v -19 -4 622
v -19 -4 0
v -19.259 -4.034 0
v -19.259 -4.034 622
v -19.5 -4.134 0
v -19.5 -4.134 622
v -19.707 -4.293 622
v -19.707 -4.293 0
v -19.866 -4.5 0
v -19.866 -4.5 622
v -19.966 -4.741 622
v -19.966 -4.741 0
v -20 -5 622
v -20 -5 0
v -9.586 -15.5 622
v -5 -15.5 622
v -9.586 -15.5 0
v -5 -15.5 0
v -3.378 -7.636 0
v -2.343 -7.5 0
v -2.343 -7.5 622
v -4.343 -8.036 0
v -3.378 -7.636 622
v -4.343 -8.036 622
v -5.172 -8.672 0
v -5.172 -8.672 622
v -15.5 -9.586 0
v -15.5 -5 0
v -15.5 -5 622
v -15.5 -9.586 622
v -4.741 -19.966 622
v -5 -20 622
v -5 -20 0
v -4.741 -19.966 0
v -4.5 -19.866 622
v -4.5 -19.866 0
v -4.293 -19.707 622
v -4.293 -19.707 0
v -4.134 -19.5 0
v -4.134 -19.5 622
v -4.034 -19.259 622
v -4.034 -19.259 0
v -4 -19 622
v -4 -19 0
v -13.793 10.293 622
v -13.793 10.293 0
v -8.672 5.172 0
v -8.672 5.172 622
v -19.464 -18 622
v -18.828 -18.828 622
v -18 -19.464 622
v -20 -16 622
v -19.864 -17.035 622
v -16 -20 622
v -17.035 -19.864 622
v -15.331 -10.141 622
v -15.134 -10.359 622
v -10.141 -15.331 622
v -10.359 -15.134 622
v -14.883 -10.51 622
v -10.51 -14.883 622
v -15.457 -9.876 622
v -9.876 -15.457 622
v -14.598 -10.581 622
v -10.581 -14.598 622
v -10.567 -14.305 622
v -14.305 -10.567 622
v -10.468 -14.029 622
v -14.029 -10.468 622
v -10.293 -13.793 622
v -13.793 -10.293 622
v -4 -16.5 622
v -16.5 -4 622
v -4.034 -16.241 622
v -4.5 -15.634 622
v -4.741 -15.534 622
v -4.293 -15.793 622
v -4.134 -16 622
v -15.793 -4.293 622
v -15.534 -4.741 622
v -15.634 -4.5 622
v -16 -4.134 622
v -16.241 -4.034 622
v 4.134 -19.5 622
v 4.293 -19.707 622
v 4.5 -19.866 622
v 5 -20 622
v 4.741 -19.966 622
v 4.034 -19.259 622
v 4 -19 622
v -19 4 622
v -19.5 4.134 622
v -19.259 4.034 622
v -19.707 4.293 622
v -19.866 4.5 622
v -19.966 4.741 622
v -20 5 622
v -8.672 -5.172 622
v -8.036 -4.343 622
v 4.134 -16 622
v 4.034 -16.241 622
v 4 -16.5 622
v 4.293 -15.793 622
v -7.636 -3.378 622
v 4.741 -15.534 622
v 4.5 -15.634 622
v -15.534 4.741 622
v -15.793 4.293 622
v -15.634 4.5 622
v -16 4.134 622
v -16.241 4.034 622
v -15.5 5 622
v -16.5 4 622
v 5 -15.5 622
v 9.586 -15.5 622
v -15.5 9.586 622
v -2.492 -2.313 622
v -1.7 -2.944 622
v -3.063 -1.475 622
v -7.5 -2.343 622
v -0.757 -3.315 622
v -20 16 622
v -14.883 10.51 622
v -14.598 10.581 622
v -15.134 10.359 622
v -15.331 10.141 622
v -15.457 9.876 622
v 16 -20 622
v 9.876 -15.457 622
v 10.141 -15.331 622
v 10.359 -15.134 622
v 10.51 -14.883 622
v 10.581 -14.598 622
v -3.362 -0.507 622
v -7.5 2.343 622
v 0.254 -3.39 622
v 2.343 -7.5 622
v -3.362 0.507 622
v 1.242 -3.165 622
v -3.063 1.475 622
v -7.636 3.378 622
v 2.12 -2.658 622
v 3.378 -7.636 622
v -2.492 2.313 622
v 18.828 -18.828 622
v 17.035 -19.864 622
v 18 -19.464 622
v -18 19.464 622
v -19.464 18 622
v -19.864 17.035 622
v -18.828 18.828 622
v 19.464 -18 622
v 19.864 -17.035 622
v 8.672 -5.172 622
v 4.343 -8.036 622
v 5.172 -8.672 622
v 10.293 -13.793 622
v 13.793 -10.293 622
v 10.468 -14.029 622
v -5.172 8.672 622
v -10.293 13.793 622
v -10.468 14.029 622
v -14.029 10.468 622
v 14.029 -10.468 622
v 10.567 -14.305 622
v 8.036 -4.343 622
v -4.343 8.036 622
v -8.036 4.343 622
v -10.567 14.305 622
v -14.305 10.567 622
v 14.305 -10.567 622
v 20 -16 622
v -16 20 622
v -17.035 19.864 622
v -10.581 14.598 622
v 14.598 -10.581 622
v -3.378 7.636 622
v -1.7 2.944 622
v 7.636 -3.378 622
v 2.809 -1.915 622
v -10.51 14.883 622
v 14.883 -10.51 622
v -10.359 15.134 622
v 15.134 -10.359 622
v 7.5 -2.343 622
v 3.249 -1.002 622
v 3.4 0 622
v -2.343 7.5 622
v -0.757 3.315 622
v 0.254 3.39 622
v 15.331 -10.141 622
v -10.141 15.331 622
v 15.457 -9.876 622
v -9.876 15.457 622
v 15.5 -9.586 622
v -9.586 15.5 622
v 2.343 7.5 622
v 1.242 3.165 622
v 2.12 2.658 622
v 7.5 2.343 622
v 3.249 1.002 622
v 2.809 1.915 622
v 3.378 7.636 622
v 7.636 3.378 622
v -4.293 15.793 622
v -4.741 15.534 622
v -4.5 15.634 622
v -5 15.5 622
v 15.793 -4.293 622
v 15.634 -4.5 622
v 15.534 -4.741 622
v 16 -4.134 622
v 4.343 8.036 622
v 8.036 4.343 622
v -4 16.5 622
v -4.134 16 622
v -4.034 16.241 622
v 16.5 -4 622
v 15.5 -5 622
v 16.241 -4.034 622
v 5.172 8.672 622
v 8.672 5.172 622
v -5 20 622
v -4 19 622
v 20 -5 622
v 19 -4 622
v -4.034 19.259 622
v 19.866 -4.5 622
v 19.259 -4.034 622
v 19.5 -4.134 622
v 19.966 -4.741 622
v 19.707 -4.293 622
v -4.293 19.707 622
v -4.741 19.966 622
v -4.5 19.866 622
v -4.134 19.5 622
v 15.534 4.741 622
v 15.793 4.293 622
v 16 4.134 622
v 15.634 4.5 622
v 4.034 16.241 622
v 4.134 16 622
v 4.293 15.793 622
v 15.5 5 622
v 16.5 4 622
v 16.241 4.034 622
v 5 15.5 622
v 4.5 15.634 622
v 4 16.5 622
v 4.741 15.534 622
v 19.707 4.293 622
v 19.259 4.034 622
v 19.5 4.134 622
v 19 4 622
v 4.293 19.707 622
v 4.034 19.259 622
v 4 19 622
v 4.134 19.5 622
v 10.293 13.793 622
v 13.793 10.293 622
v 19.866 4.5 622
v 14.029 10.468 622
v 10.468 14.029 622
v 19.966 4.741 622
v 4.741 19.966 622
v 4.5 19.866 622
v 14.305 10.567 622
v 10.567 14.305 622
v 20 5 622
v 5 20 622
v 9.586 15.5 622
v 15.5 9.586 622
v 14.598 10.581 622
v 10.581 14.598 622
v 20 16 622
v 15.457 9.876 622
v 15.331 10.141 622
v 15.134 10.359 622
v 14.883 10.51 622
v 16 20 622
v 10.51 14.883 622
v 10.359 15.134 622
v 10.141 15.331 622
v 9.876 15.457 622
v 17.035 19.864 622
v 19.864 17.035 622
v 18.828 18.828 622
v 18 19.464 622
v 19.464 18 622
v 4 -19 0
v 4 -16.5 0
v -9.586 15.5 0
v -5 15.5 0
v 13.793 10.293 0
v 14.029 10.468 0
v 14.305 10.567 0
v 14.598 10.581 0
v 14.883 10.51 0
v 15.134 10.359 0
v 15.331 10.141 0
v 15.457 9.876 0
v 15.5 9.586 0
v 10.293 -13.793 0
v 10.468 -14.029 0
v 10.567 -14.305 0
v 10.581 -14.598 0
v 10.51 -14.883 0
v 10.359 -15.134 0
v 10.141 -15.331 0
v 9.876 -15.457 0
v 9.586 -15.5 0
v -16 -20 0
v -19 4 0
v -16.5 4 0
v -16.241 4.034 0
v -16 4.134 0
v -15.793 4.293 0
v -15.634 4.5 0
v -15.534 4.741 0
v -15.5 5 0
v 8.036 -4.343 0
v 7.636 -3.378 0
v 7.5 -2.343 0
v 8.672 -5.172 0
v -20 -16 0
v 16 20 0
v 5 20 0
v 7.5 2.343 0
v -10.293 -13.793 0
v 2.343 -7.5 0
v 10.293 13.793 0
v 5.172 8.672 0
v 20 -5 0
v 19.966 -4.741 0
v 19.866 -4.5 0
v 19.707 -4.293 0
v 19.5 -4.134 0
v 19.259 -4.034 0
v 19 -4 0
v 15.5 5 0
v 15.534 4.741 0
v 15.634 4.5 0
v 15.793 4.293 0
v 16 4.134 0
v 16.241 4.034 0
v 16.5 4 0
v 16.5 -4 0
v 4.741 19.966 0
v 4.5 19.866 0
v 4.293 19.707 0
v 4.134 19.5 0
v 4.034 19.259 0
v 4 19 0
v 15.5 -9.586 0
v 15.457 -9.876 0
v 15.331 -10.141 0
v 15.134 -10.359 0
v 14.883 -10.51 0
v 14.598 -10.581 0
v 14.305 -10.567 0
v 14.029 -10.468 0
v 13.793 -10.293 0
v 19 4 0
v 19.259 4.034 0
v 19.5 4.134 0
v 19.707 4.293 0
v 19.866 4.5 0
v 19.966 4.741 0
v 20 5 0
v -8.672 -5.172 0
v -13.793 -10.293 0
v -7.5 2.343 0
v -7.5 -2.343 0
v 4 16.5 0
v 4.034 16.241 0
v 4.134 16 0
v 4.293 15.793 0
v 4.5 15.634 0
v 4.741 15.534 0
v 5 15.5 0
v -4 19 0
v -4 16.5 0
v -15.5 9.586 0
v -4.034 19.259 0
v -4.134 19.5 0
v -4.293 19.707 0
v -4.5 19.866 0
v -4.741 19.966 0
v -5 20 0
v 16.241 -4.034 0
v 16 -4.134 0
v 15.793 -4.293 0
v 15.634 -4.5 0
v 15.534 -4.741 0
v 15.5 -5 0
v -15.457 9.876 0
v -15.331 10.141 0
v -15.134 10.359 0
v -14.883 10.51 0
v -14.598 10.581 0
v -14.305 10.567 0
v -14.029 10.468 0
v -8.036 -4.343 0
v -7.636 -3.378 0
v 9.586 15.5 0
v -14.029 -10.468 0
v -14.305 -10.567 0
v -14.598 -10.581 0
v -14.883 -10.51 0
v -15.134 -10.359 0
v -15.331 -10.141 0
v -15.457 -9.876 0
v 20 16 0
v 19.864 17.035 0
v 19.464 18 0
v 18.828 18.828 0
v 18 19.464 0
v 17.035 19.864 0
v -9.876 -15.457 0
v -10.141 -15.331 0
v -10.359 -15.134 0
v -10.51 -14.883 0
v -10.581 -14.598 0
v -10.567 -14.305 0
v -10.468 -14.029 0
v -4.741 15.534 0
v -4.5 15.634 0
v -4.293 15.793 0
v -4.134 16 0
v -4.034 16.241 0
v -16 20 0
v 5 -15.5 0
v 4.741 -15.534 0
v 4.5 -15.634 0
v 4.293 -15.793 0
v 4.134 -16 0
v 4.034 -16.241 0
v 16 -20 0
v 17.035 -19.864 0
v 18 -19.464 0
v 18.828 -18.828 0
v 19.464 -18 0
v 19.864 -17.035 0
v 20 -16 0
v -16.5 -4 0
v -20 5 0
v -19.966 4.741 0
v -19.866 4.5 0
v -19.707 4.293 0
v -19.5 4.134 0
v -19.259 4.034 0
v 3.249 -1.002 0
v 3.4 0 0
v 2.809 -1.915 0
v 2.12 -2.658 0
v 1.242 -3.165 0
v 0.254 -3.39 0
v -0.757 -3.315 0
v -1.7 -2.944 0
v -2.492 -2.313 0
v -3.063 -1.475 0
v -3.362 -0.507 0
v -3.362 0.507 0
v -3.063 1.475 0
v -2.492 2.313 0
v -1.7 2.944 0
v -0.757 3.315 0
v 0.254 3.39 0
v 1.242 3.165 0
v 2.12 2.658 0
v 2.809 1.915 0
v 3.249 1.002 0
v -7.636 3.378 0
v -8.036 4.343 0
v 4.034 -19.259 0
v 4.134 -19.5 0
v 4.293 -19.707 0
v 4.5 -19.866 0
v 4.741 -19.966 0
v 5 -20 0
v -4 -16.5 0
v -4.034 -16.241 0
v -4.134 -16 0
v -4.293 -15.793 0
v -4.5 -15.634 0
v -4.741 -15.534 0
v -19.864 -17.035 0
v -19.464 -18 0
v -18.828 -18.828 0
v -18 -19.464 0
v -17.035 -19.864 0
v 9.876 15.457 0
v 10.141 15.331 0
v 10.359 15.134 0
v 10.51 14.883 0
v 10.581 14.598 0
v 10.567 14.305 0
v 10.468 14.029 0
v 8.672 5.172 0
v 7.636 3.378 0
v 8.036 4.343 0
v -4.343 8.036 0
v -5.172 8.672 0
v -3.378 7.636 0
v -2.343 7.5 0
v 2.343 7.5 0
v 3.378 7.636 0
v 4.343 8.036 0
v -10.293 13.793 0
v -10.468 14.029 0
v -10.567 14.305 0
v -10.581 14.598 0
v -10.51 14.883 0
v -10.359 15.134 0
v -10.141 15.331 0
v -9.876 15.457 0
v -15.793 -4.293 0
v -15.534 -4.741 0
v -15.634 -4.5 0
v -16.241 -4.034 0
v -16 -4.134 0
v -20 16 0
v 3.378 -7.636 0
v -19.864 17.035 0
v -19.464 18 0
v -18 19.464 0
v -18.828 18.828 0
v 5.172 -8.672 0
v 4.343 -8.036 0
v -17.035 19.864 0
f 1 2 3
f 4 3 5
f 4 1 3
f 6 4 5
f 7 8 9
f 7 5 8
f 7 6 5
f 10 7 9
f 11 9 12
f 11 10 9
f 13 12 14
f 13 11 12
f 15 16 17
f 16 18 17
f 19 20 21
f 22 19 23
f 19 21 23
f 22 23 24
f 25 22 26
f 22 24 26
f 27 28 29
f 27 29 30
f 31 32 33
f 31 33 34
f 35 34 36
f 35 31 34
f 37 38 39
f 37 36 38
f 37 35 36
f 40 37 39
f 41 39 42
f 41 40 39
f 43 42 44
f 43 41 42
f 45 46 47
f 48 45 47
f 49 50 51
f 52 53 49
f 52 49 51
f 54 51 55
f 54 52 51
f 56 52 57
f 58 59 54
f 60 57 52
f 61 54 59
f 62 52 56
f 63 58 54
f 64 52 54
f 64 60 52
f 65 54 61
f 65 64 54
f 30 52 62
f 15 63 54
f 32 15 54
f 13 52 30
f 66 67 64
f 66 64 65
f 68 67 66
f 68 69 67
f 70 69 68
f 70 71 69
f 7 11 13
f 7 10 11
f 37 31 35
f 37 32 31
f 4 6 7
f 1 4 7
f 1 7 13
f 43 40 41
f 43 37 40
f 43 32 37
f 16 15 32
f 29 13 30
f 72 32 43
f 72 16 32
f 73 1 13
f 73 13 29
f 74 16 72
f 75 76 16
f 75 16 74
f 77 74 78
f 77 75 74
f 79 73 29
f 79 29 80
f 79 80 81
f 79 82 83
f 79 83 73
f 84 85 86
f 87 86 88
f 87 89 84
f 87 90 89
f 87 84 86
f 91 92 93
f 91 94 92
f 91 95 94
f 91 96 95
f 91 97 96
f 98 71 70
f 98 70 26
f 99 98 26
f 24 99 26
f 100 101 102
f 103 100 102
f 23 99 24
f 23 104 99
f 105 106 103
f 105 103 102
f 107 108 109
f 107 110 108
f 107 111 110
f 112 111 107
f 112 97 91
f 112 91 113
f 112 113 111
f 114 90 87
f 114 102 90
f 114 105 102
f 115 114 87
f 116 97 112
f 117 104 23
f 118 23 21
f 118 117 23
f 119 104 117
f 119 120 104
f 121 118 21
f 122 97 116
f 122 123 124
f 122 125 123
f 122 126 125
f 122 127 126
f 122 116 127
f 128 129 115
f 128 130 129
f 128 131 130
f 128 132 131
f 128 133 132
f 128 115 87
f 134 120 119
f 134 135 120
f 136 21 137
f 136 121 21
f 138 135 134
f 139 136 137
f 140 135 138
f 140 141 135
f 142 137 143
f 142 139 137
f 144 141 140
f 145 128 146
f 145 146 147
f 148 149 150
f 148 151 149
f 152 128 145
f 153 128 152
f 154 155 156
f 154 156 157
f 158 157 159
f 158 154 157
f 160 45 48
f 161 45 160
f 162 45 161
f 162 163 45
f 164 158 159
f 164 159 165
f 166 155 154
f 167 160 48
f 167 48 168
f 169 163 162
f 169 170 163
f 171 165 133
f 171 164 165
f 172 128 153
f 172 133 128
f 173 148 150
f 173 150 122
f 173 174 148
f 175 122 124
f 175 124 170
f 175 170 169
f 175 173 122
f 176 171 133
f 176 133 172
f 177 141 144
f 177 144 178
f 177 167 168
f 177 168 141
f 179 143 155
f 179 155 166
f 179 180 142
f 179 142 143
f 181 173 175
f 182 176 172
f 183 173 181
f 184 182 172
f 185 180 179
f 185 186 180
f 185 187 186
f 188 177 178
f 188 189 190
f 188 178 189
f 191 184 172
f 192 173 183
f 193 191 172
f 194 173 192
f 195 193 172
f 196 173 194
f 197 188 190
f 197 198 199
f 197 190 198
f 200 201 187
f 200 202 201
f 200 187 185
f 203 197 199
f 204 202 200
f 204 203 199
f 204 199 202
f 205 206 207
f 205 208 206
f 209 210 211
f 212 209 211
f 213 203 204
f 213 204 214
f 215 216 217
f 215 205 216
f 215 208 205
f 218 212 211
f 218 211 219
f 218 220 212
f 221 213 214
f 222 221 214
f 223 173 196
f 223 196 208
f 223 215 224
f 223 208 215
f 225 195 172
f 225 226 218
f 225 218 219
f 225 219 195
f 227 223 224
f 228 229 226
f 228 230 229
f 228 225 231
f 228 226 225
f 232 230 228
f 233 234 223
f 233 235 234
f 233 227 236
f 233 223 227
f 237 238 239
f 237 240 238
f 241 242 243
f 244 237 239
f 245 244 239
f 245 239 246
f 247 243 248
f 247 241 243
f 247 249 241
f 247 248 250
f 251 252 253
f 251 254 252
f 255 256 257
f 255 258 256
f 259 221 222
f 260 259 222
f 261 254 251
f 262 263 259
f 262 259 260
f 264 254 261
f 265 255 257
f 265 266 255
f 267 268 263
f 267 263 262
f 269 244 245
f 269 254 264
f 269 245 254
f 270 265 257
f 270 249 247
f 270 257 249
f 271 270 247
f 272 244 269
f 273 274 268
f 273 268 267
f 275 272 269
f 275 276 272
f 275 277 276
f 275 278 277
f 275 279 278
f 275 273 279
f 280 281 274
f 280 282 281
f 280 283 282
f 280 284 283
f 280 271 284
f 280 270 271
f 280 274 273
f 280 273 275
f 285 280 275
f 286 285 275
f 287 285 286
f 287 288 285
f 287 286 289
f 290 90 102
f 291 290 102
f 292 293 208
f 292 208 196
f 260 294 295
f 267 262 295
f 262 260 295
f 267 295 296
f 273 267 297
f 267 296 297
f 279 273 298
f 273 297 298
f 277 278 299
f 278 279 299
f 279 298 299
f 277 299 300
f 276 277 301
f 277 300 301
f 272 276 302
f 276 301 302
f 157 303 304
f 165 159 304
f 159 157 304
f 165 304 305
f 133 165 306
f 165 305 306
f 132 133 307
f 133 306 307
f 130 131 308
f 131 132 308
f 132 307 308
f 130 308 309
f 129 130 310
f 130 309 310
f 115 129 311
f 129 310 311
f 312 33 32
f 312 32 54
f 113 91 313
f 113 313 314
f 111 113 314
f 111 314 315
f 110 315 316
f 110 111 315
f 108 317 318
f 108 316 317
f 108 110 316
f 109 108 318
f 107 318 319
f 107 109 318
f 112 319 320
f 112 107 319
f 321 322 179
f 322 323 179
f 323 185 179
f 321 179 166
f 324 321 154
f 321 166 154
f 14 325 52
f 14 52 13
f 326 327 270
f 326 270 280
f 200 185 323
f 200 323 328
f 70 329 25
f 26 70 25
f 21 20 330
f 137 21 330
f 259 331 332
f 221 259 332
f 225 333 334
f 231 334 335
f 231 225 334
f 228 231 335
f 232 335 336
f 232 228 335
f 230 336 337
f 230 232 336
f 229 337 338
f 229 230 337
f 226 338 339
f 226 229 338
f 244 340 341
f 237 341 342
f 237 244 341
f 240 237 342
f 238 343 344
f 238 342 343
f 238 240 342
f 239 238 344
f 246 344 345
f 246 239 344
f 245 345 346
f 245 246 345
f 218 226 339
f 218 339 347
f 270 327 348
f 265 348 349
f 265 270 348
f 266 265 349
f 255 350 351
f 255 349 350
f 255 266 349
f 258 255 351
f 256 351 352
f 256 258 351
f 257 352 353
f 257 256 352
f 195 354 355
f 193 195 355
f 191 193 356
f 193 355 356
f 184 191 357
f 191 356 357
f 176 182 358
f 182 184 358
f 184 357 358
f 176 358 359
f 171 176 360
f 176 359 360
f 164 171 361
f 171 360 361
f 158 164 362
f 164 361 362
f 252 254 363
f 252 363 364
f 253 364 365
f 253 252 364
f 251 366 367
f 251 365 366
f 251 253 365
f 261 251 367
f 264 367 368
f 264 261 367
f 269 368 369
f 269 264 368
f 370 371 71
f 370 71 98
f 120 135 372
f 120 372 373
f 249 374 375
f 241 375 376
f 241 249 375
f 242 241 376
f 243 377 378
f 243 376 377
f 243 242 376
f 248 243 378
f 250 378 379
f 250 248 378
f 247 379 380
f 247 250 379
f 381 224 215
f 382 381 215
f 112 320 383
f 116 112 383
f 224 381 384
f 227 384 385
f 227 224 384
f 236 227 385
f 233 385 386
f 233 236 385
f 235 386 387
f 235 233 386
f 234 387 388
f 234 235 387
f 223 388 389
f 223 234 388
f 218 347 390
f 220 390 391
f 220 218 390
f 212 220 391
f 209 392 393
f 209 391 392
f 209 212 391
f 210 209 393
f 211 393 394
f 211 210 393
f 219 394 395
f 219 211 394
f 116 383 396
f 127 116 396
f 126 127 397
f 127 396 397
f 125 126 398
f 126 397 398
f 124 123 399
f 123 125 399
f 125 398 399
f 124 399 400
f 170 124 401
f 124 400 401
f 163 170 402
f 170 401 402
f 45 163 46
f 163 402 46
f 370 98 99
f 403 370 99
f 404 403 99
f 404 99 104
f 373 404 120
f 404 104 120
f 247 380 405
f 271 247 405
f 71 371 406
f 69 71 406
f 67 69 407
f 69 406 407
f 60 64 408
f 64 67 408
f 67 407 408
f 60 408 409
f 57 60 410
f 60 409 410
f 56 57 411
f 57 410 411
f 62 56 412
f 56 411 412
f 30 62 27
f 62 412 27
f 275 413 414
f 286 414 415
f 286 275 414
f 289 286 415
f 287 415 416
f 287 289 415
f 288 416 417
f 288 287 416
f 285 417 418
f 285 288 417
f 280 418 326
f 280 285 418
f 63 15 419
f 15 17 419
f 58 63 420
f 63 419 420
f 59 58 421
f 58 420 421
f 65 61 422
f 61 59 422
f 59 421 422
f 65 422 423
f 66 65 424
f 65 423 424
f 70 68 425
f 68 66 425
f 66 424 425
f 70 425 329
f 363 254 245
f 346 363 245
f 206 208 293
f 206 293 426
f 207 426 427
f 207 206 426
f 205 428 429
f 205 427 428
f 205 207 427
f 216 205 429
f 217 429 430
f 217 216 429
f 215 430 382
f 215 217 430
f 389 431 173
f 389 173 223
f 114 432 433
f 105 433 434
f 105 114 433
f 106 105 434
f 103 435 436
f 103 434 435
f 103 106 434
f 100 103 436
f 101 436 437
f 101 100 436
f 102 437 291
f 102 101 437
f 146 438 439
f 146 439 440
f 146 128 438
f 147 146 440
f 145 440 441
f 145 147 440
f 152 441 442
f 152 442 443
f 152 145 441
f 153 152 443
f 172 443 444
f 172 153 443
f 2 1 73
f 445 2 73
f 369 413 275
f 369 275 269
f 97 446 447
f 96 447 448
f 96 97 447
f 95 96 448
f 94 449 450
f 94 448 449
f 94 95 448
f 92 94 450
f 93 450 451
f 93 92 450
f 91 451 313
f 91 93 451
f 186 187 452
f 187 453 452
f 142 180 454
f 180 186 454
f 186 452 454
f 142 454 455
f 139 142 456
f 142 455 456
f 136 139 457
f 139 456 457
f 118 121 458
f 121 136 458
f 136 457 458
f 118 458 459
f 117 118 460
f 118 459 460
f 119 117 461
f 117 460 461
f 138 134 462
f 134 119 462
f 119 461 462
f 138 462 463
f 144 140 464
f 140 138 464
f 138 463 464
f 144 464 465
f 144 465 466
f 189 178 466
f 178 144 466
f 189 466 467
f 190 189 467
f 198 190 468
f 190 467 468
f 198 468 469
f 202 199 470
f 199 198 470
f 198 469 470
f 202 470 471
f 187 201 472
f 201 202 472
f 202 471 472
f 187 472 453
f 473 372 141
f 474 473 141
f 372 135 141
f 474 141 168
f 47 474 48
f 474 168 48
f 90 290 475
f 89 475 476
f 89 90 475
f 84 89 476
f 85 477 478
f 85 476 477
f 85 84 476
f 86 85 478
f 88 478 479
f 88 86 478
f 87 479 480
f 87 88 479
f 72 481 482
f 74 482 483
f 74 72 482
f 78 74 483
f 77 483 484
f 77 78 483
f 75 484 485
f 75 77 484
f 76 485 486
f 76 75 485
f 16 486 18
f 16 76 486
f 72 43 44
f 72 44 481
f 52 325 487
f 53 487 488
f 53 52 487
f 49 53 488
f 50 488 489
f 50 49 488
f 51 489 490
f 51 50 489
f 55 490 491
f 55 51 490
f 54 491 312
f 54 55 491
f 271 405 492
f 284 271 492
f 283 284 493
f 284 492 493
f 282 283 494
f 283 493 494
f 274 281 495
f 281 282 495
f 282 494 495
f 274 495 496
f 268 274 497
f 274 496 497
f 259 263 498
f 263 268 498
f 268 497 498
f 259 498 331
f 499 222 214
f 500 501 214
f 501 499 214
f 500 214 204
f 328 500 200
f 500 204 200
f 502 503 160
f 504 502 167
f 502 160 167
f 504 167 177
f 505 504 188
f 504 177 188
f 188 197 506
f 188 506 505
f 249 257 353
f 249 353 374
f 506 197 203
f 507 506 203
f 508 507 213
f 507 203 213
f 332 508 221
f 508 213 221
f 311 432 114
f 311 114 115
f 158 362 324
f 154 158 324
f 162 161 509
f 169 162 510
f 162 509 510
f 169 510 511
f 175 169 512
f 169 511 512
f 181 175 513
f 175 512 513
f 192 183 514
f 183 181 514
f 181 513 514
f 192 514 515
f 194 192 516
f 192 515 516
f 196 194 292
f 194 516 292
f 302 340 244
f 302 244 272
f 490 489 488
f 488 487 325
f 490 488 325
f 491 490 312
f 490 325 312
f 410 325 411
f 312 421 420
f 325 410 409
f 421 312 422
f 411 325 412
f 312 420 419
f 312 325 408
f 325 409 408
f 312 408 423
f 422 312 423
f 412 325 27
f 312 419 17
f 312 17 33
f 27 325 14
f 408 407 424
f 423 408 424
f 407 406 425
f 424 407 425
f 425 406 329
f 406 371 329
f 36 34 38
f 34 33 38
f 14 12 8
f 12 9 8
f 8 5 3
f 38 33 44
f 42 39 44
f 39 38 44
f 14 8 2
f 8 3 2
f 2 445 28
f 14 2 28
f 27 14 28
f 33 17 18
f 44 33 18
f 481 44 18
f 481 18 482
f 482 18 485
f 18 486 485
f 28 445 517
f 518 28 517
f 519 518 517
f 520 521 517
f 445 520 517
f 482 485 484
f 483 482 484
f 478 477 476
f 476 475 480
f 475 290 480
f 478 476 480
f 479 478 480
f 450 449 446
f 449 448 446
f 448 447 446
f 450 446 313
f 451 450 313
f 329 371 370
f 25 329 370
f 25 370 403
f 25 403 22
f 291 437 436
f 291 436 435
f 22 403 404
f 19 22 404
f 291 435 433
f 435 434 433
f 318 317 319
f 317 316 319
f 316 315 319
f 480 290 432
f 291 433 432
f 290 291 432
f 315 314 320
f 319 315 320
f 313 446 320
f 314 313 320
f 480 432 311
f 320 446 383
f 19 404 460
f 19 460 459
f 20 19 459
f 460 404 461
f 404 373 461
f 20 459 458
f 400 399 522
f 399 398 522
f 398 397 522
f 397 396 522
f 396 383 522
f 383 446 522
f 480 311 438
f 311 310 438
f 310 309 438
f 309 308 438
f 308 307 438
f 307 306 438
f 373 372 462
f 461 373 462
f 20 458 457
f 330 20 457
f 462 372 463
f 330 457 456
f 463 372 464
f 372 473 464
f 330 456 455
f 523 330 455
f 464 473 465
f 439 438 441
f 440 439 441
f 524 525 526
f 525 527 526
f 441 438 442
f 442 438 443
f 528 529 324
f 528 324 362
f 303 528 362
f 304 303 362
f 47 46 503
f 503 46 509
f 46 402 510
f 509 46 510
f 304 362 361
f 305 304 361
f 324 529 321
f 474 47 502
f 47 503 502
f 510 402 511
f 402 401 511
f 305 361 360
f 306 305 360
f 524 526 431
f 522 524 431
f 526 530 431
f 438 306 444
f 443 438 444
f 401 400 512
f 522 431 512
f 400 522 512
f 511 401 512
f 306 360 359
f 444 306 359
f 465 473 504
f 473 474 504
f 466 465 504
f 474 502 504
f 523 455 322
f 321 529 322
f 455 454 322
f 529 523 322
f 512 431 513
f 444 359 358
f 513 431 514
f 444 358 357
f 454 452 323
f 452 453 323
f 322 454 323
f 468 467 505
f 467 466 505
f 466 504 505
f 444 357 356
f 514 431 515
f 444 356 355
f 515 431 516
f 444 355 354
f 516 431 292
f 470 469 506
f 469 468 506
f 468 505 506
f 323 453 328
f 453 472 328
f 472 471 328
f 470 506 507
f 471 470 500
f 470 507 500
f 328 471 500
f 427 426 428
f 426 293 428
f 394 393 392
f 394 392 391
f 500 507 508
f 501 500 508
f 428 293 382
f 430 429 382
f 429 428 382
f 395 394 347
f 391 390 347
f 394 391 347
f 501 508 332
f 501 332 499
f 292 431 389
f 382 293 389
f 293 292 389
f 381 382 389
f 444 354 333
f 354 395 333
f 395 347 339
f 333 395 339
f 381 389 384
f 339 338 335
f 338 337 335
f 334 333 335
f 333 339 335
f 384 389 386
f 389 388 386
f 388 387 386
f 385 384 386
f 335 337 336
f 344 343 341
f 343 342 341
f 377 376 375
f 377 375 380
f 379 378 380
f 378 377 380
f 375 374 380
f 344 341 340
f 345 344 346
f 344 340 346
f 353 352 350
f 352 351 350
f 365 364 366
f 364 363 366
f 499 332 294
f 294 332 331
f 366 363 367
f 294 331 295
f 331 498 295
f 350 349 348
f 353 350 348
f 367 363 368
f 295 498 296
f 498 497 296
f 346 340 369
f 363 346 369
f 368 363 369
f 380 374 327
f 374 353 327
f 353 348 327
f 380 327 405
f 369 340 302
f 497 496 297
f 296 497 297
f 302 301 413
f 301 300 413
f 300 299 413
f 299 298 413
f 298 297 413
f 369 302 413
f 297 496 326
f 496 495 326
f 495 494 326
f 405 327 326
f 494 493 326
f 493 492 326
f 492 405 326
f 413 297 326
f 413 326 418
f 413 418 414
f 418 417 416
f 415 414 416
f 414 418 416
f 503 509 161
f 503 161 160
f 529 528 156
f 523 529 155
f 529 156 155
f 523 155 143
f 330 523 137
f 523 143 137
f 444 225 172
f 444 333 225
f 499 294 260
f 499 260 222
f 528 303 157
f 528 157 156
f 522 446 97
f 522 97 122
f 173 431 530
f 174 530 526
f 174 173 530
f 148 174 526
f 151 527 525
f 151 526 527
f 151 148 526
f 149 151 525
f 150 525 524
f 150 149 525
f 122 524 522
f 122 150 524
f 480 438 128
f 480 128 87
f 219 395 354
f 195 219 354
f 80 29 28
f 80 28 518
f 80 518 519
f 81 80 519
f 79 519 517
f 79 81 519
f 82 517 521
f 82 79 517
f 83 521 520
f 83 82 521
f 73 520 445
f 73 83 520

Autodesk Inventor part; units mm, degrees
ref_plane "YZ Plane" through (0, 0, 0) normal (1, 0, 0) x (0, 1, 0)
ref_plane "XZ Plane" through (0, 0, 0) normal (0, 1, 0) x (-1, 0, 0)
ref_plane "XY Plane" through (0, 0, 0) normal (0, 0, 1) x (1, 0, 0)
sketch "T-Slot 4040 Base" plane through (0, 0, 0) normal (0, 0, 1) x (1, 0, 0)
  line L0 (-28, 0) -> (28, 0) construction
  line L1 (0, -28) -> (0, 28) construction
  circle A0 centre (0, 0) radius 3.4
  line L2 (-7.5, -7.5) -> (7.5, -7.5)
  line L3 (7.5, -7.5) -> (7.5, 7.5)
  line L4 (7.5, 7.5) -> (-7.5, 7.5)
  line L5 (-7.5, 7.5) -> (-7.5, -7.5)
  line L6 (-7.5, -7.5) -> (7.5, 7.5) construction
  line L7 (7.5, -7.5) -> (-7.5, 7.5) construction
  line L8 (20, 4) -> (15.5, 4)
  line L9 (15.5, 4) -> (15.5, 12)
  line L10 (15.5, 12) -> (7.5, 4)
  line L11 (4, 20) -> (4, 15.5)
  line L12 (4, 15.5) -> (12, 15.5)
  line L13 (12, 15.5) -> (4, 7.5)
  line L14 (7.5, -7.5) -> (-7.5, -7.5)
  arc A1 (15.5, 9.5858) -> (13.7929, 10.2929) centre (14.5, 9.5858) ccw
  arc A2 (10.2929, 13.7929) -> (9.5858, 15.5) centre (9.5858, 14.5) ccw
  line L15 (-20, 20) -> (20, 20)
  line L16 (20, 20) -> (20, -20)
  line L17 (20, -20) -> (-20, -20)
  line L18 (-20, -20) -> (-20, 20)
  line L19 (-20, 20) -> (20, -20) construction
  line L20 (20, 20) -> (-20, -20) construction
  line L21 (-4, 15.5) -> (-12, 15.5)
  arc A3 (-9.5858, 15.5) -> (-10.2929, 13.7929) centre (-9.5858, 14.5) ccw
  line L22 (-12, 15.5) -> (-4, 7.5)
  line L23 (-15.5, 12) -> (-7.5, 4)
  line L24 (-20, 4) -> (-15.5, 4)
  arc A4 (-13.7929, 10.2929) -> (-15.5, 9.5858) centre (-14.5, 9.5858) ccw
  line L25 (-15.5, 4) -> (-15.5, 12)
  line L26 (-4, 20) -> (-4, 15.5)
  line L27 (-15.5, -4) -> (-15.5, -12)
  arc A5 (-15.5, -9.5858) -> (-13.7929, -10.2929) centre (-14.5, -9.5858) ccw
  line L28 (-15.5, -12) -> (-7.5, -4)
  line L29 (-12, -15.5) -> (-4, -7.5)
  line L30 (-4, -20) -> (-4, -15.5)
  arc A6 (-10.2929, -13.7929) -> (-9.5858, -15.5) centre (-9.5858, -14.5) ccw
  line L31 (-4, -15.5) -> (-12, -15.5)
  line L32 (-20, -4) -> (-15.5, -4)
  line L33 (4, -15.5) -> (12, -15.5)
  arc A7 (9.5858, -15.5) -> (10.2929, -13.7929) centre (9.5858, -14.5) ccw
  line L34 (12, -15.5) -> (4, -7.5)
  line L35 (15.5, -12) -> (7.5, -4)
  line L36 (20, -4) -> (15.5, -4)
  arc A8 (13.7929, -10.2929) -> (15.5, -9.5858) centre (14.5, -9.5858) ccw
  line L37 (15.5, -4) -> (15.5, -12)
  line L38 (4, -20) -> (4, -15.5)
  point P0 (4.9274, 7.75)
  point P1 (9.5858, 15.5)
  point P2 (-20, 20)
  point P3 (-7.5, -7.5)
  point P4 (-20, -20)
  point P5 (7.5, -7.5)
  point P6 (20, -20)
  point P7 (-9.5858, -15.5)
  point P8 (-4, -7.5)
  point P9 (15.5, -9.5858)
  point P10 (7.5, -4)
  point P11 (-15.5, 9.5858)
  point P12 (-4, 7.5)
  dimension "d35" = 6.8
  dimension "d37" = 12
  dimension "d38" = 1
  dimension "d43" = 40
  dimension "d44" = 40
  dimension "d45" = 4.5
  dimension "d46" = 4
  dimension "d53" = 360
extrude "Extrusion1" add sketch "T-Slot 4040 Base" along normal blind 622 contours L5 L4 L3 L2 | L2 L29 L31 L30 L17 L18 L32 L27 L28 L5 | L2 L3 L35 L37 L36 L16 L17 L38 L33 L34 | A6 L31 L29 | L23 L25 L24 L18 L15 L26 L21 L22 L4 L5 | L28 L27 A5 | L34 L33 A7 | A4 L25 L23 | L3 L4 L13 L12 L11 L15 L16 L8 L9 L10 | A8 L37 L35 | L22 L21 A3 | L10 L9 A1 | A2 L12 L13
fillet "Rundung1" radius 1 16 edges at (4, 15.5, 311) (15.5, 4, 311) (20, 4, 311) (4, 20, 311) (-20, 4, 311) (-15.5, 4, 311) (-4, 15.5, 311) (-4, 20, 311) (-4, -15.5, 311) (-4, -20, 311) (4, -15.5, 311) (4, -20, 311) (15.5, -4, 311) (20, -4, 311) (-20, -4, 311) (-15.5, -4, 311)
fillet "Rundung2" radius 4 12 edges at (4, 7.5, 311) (7.5, 4, 311) (-20, 20, 311) (-20, -20, 311) (20, 20, 311) (20, -20, 311) (7.5, -4, 311) (-7.5, -4, 311) (-7.5, 4, 311) (4, -7.5, 311) (-4, -7.5, 311) (-4, 7.5, 311)
properties part number "T-SLOT 4040 B-Type 622mm"
